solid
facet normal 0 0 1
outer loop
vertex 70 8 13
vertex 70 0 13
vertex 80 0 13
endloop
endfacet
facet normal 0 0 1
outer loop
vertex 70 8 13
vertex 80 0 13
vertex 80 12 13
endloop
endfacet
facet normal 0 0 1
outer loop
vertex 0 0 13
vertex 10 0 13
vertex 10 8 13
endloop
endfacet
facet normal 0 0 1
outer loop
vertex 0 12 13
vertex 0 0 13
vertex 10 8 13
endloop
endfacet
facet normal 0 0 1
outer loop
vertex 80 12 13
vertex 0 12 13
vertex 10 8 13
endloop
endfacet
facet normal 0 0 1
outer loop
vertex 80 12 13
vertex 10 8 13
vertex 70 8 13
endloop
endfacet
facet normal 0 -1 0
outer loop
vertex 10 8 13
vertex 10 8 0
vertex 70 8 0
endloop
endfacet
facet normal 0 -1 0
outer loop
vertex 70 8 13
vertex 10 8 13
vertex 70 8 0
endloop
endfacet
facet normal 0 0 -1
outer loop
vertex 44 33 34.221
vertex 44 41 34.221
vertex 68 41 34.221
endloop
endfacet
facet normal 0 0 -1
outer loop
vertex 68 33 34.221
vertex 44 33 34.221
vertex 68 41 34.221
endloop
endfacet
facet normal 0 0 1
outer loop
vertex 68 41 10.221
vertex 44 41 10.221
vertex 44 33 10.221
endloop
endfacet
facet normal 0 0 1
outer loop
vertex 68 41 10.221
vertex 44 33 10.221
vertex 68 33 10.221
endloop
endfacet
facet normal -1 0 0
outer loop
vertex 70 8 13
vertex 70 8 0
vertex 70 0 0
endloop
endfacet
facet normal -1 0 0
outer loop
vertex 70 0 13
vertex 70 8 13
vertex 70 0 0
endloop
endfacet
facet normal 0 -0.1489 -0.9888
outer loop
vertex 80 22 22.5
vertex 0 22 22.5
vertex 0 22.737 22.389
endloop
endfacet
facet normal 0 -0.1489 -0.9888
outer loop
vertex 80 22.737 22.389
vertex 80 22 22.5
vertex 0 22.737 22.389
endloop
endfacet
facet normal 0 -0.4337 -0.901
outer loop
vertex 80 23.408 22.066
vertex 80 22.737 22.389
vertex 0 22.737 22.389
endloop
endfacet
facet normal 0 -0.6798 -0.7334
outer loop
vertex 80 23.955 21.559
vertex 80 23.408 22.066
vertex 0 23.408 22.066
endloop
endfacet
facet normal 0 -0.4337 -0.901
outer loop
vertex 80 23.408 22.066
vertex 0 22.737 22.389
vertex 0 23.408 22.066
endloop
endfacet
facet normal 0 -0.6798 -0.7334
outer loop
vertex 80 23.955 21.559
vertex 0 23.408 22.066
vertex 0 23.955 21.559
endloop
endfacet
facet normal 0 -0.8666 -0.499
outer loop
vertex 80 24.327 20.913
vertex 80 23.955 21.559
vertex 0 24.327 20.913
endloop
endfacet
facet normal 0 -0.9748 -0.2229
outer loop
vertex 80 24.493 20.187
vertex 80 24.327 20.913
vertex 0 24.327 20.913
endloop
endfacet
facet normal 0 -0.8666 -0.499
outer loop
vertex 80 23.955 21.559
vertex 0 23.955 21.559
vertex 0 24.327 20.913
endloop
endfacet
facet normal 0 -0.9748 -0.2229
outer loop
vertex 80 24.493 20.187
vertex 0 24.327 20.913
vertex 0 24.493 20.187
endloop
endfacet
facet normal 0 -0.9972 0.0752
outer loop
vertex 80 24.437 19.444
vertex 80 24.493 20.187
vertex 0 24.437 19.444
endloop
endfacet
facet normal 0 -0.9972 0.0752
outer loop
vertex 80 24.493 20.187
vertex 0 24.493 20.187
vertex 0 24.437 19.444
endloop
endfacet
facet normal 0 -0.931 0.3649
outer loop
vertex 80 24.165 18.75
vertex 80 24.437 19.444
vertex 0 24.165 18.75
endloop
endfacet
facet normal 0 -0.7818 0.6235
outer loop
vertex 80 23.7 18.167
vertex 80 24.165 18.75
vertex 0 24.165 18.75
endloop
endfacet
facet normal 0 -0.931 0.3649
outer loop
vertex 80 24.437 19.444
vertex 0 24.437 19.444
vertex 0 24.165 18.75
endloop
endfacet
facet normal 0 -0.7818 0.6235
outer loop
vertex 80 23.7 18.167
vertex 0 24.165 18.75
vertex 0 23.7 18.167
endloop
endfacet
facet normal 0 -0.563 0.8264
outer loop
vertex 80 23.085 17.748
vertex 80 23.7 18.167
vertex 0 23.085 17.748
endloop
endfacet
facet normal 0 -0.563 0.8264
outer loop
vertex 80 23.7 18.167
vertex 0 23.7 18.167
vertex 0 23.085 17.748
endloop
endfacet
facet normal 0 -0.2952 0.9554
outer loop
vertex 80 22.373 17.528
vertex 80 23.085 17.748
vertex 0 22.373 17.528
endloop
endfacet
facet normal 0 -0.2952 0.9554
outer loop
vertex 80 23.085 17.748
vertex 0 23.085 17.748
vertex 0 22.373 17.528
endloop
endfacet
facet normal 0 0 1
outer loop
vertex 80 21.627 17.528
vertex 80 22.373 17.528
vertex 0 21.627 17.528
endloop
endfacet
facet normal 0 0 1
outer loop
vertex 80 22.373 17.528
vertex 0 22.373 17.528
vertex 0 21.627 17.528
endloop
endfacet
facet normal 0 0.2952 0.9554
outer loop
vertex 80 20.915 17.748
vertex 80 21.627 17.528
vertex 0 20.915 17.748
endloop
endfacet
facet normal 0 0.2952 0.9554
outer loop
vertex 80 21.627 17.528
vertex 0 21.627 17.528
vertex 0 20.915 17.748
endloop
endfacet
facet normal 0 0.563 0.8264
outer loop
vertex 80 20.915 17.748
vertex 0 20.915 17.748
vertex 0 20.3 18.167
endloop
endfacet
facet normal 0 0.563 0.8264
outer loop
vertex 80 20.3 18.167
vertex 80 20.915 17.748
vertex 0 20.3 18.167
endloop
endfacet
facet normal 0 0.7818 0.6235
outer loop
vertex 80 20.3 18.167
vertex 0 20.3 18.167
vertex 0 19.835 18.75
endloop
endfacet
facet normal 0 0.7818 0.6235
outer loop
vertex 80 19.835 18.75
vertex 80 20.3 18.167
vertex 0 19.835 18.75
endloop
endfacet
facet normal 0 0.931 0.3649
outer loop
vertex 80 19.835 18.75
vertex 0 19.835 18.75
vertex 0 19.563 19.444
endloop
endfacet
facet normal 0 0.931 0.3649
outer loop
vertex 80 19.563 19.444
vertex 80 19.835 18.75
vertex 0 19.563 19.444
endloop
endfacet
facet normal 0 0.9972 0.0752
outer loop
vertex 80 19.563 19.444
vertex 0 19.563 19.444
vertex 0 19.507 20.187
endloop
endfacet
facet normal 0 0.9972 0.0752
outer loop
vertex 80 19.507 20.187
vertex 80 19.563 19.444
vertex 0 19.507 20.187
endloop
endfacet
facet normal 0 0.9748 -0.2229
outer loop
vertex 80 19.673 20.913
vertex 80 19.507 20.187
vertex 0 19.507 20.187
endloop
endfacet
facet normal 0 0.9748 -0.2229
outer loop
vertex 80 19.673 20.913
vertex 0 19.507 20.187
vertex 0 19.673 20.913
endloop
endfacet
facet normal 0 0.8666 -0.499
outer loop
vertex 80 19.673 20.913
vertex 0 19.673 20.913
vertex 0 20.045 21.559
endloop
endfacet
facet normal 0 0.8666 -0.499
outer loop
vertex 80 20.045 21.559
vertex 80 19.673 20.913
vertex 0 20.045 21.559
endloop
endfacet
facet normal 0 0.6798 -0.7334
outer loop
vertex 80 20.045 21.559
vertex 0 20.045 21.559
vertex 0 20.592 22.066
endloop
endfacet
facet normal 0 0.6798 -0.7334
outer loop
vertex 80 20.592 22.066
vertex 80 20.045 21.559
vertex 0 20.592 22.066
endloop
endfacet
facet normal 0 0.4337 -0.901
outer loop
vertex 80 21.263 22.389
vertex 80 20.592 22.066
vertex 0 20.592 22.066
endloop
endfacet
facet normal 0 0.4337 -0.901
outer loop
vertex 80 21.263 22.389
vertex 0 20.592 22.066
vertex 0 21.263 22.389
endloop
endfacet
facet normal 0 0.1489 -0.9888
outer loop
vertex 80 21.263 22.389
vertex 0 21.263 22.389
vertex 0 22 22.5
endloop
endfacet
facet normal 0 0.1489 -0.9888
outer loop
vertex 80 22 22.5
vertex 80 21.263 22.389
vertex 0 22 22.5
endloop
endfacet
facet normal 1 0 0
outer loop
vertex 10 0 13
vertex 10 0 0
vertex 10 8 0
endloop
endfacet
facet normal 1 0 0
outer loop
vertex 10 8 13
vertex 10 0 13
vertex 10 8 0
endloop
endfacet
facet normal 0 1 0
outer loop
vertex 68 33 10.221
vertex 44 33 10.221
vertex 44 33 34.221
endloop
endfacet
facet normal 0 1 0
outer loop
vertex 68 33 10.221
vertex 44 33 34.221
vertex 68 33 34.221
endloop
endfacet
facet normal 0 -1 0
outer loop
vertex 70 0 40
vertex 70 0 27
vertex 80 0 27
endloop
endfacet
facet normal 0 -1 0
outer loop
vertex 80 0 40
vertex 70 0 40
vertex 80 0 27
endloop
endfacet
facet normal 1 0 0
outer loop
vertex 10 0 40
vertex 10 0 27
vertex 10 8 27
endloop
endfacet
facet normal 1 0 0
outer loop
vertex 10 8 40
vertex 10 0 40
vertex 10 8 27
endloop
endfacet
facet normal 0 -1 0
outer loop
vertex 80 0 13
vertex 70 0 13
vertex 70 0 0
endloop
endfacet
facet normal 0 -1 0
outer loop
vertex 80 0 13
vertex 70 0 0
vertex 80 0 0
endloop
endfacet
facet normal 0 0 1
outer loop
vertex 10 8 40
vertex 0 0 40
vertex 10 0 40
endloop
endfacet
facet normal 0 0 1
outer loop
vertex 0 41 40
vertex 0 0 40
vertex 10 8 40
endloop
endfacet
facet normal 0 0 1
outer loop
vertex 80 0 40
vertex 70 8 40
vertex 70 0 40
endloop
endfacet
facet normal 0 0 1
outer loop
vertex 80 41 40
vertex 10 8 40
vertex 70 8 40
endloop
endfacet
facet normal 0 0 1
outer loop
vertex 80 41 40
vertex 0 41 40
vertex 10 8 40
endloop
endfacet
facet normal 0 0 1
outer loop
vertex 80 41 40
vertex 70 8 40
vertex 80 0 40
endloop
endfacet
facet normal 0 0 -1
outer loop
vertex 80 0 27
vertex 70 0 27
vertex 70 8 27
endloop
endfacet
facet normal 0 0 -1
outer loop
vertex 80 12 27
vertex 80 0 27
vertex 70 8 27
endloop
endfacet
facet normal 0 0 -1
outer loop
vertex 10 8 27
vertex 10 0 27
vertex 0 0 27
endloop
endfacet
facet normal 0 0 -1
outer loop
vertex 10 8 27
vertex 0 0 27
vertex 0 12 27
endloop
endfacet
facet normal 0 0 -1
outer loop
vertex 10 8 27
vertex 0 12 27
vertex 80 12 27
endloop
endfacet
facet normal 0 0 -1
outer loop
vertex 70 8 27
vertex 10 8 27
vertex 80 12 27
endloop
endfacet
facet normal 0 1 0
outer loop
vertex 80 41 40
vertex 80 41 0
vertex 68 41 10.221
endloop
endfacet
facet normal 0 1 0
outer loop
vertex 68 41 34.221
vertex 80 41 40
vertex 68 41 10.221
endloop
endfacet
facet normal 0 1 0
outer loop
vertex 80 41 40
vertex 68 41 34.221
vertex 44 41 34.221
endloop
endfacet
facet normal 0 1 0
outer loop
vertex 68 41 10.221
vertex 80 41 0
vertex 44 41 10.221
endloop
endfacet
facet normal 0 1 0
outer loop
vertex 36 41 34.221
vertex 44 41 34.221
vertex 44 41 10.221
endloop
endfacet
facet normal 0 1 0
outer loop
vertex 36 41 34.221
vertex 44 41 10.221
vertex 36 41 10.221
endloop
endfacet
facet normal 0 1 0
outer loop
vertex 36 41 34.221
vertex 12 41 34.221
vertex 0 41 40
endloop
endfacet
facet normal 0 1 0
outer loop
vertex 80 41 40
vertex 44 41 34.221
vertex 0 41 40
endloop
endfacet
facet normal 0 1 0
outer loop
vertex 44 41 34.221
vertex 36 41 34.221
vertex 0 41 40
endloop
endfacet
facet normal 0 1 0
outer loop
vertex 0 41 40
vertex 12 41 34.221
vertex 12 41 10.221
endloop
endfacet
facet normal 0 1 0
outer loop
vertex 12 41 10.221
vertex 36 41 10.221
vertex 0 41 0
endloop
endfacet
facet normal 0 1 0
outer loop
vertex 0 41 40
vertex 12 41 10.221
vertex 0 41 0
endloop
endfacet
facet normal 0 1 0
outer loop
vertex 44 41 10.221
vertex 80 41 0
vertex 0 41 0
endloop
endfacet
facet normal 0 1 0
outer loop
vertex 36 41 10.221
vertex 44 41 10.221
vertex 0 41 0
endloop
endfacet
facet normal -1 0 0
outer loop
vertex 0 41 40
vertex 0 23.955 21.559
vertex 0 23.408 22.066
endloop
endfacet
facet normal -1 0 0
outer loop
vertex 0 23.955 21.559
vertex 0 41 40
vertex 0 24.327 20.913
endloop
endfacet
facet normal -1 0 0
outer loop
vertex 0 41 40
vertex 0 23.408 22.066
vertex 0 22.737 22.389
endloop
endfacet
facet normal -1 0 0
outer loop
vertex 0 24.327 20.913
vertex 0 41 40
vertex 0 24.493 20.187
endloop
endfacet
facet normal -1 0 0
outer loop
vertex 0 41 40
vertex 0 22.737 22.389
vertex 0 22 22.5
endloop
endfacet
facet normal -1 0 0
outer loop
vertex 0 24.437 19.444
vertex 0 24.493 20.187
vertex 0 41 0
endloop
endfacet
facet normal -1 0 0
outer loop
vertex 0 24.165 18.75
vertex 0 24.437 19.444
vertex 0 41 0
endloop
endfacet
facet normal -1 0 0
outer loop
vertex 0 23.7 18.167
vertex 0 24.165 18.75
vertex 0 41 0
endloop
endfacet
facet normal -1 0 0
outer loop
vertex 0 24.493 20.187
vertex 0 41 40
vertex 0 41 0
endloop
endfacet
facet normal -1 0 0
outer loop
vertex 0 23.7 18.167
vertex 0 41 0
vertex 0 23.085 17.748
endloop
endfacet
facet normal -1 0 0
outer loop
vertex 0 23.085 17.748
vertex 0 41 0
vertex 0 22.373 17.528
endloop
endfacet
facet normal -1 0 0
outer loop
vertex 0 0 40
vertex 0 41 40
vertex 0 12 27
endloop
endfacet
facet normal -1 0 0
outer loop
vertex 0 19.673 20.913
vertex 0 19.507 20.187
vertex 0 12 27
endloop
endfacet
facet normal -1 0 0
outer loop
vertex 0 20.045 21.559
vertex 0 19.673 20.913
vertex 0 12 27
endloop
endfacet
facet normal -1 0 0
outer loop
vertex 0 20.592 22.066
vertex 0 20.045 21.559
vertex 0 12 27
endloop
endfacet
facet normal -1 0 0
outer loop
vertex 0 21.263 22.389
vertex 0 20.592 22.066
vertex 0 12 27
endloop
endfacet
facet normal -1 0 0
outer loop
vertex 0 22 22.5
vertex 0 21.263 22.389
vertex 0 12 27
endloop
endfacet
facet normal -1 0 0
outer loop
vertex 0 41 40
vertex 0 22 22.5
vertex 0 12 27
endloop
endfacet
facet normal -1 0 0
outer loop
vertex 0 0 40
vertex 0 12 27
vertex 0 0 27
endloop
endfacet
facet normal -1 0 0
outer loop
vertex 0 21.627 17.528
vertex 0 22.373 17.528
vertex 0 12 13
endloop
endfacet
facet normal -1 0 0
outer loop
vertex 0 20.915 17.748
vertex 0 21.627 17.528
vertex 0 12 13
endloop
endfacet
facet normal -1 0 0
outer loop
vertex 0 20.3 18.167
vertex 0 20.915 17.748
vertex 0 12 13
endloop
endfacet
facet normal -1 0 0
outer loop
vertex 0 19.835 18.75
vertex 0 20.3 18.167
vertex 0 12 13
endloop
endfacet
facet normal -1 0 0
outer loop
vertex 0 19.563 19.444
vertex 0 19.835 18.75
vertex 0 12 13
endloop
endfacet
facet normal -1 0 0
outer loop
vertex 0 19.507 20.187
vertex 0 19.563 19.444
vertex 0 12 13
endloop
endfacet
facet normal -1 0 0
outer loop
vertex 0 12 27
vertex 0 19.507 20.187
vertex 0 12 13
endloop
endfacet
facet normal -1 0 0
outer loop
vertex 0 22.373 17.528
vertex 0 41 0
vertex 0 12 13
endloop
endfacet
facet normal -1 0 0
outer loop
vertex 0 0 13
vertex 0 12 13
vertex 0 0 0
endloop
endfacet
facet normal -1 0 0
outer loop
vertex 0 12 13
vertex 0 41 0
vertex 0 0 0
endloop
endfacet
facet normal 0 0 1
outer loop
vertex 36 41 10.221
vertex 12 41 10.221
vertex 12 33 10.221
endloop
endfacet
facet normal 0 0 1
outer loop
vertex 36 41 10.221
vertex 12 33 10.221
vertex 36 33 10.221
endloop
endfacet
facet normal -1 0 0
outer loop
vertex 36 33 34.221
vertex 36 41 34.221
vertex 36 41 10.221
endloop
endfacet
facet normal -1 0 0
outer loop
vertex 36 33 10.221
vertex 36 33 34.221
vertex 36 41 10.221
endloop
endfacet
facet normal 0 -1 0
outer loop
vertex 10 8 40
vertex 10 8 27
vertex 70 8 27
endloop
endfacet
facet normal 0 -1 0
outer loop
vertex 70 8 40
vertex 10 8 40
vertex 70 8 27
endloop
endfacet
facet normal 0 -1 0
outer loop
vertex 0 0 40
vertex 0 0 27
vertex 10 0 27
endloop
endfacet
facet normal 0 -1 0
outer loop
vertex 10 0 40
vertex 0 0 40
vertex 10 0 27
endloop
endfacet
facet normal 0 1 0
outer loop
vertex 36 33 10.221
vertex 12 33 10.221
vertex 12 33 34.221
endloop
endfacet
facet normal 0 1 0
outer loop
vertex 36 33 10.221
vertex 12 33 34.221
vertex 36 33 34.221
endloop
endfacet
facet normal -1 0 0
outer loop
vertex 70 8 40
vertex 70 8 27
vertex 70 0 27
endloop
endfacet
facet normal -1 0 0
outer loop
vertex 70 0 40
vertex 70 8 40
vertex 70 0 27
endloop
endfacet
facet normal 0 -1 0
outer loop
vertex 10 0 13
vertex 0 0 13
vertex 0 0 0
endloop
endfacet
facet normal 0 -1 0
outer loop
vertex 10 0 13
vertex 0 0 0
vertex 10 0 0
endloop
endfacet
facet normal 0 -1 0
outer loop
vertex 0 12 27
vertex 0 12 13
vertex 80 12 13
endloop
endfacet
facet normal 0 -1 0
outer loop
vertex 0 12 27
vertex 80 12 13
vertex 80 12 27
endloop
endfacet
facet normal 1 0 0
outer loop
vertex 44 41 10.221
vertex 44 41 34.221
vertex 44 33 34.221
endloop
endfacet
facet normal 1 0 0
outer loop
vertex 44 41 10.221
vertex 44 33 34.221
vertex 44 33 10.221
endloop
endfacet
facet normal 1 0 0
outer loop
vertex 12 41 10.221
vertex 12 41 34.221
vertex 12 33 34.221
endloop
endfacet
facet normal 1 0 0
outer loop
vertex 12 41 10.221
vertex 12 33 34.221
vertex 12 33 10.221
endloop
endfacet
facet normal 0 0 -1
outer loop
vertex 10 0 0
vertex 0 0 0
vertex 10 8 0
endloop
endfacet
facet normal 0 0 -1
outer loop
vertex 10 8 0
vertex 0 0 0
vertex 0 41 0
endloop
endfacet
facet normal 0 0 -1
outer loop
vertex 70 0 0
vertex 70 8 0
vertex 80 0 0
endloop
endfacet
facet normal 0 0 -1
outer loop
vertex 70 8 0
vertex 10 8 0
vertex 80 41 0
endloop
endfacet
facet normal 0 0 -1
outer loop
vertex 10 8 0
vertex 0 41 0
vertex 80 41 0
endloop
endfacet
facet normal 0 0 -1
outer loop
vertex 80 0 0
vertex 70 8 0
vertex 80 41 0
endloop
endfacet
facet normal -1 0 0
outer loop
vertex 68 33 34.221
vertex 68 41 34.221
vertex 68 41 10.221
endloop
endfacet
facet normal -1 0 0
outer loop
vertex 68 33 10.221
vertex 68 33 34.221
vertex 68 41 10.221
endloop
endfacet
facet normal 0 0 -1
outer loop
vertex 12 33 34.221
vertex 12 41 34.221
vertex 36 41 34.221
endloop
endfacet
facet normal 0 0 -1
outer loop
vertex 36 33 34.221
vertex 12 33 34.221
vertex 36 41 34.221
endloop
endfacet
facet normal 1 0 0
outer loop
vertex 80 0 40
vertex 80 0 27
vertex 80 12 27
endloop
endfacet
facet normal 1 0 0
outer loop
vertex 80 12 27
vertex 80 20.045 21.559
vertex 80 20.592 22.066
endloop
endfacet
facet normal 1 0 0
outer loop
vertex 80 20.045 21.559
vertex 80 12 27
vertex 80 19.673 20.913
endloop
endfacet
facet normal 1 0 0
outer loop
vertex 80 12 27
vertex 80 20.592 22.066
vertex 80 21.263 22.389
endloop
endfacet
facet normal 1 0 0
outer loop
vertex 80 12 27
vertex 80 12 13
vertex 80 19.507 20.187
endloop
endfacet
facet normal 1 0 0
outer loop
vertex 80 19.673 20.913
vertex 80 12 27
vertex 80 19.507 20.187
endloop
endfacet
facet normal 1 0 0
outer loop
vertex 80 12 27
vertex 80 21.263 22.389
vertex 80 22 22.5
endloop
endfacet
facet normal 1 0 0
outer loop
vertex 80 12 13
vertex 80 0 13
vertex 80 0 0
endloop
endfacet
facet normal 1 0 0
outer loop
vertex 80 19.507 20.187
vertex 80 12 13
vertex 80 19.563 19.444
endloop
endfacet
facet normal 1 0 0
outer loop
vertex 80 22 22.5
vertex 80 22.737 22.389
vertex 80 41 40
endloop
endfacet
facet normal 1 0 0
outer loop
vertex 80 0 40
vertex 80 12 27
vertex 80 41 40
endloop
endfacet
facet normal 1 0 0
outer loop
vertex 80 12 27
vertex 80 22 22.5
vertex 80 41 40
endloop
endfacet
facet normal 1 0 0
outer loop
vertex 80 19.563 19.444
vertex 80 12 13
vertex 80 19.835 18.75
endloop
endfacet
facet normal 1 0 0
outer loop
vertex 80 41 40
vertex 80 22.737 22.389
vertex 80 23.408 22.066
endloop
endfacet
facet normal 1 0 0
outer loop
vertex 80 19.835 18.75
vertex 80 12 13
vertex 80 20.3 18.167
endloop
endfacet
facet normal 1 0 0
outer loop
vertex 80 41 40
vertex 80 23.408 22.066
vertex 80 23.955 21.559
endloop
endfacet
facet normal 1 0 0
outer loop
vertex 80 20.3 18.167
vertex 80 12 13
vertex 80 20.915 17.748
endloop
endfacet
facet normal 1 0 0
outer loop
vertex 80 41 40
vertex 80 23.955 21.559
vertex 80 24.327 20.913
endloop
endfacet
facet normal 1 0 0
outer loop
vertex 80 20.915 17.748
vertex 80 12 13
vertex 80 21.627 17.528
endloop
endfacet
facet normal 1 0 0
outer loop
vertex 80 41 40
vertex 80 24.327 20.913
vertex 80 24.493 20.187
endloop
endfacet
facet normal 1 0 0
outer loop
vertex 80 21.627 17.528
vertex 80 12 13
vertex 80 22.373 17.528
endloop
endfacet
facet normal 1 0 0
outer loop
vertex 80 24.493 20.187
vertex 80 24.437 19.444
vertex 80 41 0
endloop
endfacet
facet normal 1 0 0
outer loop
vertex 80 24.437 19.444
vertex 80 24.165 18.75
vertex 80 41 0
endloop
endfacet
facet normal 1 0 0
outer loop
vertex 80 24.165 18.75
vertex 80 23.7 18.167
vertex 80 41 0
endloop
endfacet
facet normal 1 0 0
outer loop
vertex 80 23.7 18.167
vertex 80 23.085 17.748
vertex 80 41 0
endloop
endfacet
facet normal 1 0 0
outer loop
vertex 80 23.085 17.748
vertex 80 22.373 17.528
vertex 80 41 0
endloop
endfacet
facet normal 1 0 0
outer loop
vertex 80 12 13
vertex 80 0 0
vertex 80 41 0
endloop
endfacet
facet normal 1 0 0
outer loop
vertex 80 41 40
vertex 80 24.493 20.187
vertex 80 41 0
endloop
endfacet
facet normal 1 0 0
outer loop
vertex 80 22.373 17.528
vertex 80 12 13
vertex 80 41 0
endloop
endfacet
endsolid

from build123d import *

# Parameters (mm, degrees)
EXTRUDE_1_DEPTH     = 40
SKETCH_2_R          = 2.5
SKETCH_2_W          = 14
SKETCH_2_H          = 12
CUT_EXTRUDE_1_DEPTH = 99.392072851
SKETCH_3_W          = 24
SKETCH_3_H          = 24
CUT_EXTRUDE_2_DEPTH = 8


with BuildPart() as part:
    # Эскиз1 → Бобышка-Вытянуть1 (new body)
    with BuildSketch(Plane.XY):
        Polygon((0, 0), (10, 0), (10, 8), (70, 8), (70, 0), (80, 0), (80, 41), (0, 41), align=None)
    extrude(amount=EXTRUDE_1_DEPTH)

    # Эскиз2 → Вырез-Вытянуть1 (cut, through all)
    with BuildSketch(Plane.ZY):
        with Locations((20, 22)):
            Circle(SKETCH_2_R)
        with Locations((20, 6)):
            Rectangle(SKETCH_2_W, SKETCH_2_H)
    extrude(amount=-CUT_EXTRUDE_1_DEPTH, mode=Mode.SUBTRACT)

    # Эскиз3 → Вырез-Вытянуть2 (cut)
    with BuildSketch(Plane(origin=(0, 41, 0), x_dir=(1, 0, 0), z_dir=(0, 1, 0))):
        with Locations((24, -22.220912541)):
            Rectangle(SKETCH_3_W, SKETCH_3_H)
        with Locations((56, -22.220912541)):
            Rectangle(SKETCH_3_W, SKETCH_3_H)
    extrude(amount=-CUT_EXTRUDE_2_DEPTH, mode=Mode.SUBTRACT)


solid = part.part
